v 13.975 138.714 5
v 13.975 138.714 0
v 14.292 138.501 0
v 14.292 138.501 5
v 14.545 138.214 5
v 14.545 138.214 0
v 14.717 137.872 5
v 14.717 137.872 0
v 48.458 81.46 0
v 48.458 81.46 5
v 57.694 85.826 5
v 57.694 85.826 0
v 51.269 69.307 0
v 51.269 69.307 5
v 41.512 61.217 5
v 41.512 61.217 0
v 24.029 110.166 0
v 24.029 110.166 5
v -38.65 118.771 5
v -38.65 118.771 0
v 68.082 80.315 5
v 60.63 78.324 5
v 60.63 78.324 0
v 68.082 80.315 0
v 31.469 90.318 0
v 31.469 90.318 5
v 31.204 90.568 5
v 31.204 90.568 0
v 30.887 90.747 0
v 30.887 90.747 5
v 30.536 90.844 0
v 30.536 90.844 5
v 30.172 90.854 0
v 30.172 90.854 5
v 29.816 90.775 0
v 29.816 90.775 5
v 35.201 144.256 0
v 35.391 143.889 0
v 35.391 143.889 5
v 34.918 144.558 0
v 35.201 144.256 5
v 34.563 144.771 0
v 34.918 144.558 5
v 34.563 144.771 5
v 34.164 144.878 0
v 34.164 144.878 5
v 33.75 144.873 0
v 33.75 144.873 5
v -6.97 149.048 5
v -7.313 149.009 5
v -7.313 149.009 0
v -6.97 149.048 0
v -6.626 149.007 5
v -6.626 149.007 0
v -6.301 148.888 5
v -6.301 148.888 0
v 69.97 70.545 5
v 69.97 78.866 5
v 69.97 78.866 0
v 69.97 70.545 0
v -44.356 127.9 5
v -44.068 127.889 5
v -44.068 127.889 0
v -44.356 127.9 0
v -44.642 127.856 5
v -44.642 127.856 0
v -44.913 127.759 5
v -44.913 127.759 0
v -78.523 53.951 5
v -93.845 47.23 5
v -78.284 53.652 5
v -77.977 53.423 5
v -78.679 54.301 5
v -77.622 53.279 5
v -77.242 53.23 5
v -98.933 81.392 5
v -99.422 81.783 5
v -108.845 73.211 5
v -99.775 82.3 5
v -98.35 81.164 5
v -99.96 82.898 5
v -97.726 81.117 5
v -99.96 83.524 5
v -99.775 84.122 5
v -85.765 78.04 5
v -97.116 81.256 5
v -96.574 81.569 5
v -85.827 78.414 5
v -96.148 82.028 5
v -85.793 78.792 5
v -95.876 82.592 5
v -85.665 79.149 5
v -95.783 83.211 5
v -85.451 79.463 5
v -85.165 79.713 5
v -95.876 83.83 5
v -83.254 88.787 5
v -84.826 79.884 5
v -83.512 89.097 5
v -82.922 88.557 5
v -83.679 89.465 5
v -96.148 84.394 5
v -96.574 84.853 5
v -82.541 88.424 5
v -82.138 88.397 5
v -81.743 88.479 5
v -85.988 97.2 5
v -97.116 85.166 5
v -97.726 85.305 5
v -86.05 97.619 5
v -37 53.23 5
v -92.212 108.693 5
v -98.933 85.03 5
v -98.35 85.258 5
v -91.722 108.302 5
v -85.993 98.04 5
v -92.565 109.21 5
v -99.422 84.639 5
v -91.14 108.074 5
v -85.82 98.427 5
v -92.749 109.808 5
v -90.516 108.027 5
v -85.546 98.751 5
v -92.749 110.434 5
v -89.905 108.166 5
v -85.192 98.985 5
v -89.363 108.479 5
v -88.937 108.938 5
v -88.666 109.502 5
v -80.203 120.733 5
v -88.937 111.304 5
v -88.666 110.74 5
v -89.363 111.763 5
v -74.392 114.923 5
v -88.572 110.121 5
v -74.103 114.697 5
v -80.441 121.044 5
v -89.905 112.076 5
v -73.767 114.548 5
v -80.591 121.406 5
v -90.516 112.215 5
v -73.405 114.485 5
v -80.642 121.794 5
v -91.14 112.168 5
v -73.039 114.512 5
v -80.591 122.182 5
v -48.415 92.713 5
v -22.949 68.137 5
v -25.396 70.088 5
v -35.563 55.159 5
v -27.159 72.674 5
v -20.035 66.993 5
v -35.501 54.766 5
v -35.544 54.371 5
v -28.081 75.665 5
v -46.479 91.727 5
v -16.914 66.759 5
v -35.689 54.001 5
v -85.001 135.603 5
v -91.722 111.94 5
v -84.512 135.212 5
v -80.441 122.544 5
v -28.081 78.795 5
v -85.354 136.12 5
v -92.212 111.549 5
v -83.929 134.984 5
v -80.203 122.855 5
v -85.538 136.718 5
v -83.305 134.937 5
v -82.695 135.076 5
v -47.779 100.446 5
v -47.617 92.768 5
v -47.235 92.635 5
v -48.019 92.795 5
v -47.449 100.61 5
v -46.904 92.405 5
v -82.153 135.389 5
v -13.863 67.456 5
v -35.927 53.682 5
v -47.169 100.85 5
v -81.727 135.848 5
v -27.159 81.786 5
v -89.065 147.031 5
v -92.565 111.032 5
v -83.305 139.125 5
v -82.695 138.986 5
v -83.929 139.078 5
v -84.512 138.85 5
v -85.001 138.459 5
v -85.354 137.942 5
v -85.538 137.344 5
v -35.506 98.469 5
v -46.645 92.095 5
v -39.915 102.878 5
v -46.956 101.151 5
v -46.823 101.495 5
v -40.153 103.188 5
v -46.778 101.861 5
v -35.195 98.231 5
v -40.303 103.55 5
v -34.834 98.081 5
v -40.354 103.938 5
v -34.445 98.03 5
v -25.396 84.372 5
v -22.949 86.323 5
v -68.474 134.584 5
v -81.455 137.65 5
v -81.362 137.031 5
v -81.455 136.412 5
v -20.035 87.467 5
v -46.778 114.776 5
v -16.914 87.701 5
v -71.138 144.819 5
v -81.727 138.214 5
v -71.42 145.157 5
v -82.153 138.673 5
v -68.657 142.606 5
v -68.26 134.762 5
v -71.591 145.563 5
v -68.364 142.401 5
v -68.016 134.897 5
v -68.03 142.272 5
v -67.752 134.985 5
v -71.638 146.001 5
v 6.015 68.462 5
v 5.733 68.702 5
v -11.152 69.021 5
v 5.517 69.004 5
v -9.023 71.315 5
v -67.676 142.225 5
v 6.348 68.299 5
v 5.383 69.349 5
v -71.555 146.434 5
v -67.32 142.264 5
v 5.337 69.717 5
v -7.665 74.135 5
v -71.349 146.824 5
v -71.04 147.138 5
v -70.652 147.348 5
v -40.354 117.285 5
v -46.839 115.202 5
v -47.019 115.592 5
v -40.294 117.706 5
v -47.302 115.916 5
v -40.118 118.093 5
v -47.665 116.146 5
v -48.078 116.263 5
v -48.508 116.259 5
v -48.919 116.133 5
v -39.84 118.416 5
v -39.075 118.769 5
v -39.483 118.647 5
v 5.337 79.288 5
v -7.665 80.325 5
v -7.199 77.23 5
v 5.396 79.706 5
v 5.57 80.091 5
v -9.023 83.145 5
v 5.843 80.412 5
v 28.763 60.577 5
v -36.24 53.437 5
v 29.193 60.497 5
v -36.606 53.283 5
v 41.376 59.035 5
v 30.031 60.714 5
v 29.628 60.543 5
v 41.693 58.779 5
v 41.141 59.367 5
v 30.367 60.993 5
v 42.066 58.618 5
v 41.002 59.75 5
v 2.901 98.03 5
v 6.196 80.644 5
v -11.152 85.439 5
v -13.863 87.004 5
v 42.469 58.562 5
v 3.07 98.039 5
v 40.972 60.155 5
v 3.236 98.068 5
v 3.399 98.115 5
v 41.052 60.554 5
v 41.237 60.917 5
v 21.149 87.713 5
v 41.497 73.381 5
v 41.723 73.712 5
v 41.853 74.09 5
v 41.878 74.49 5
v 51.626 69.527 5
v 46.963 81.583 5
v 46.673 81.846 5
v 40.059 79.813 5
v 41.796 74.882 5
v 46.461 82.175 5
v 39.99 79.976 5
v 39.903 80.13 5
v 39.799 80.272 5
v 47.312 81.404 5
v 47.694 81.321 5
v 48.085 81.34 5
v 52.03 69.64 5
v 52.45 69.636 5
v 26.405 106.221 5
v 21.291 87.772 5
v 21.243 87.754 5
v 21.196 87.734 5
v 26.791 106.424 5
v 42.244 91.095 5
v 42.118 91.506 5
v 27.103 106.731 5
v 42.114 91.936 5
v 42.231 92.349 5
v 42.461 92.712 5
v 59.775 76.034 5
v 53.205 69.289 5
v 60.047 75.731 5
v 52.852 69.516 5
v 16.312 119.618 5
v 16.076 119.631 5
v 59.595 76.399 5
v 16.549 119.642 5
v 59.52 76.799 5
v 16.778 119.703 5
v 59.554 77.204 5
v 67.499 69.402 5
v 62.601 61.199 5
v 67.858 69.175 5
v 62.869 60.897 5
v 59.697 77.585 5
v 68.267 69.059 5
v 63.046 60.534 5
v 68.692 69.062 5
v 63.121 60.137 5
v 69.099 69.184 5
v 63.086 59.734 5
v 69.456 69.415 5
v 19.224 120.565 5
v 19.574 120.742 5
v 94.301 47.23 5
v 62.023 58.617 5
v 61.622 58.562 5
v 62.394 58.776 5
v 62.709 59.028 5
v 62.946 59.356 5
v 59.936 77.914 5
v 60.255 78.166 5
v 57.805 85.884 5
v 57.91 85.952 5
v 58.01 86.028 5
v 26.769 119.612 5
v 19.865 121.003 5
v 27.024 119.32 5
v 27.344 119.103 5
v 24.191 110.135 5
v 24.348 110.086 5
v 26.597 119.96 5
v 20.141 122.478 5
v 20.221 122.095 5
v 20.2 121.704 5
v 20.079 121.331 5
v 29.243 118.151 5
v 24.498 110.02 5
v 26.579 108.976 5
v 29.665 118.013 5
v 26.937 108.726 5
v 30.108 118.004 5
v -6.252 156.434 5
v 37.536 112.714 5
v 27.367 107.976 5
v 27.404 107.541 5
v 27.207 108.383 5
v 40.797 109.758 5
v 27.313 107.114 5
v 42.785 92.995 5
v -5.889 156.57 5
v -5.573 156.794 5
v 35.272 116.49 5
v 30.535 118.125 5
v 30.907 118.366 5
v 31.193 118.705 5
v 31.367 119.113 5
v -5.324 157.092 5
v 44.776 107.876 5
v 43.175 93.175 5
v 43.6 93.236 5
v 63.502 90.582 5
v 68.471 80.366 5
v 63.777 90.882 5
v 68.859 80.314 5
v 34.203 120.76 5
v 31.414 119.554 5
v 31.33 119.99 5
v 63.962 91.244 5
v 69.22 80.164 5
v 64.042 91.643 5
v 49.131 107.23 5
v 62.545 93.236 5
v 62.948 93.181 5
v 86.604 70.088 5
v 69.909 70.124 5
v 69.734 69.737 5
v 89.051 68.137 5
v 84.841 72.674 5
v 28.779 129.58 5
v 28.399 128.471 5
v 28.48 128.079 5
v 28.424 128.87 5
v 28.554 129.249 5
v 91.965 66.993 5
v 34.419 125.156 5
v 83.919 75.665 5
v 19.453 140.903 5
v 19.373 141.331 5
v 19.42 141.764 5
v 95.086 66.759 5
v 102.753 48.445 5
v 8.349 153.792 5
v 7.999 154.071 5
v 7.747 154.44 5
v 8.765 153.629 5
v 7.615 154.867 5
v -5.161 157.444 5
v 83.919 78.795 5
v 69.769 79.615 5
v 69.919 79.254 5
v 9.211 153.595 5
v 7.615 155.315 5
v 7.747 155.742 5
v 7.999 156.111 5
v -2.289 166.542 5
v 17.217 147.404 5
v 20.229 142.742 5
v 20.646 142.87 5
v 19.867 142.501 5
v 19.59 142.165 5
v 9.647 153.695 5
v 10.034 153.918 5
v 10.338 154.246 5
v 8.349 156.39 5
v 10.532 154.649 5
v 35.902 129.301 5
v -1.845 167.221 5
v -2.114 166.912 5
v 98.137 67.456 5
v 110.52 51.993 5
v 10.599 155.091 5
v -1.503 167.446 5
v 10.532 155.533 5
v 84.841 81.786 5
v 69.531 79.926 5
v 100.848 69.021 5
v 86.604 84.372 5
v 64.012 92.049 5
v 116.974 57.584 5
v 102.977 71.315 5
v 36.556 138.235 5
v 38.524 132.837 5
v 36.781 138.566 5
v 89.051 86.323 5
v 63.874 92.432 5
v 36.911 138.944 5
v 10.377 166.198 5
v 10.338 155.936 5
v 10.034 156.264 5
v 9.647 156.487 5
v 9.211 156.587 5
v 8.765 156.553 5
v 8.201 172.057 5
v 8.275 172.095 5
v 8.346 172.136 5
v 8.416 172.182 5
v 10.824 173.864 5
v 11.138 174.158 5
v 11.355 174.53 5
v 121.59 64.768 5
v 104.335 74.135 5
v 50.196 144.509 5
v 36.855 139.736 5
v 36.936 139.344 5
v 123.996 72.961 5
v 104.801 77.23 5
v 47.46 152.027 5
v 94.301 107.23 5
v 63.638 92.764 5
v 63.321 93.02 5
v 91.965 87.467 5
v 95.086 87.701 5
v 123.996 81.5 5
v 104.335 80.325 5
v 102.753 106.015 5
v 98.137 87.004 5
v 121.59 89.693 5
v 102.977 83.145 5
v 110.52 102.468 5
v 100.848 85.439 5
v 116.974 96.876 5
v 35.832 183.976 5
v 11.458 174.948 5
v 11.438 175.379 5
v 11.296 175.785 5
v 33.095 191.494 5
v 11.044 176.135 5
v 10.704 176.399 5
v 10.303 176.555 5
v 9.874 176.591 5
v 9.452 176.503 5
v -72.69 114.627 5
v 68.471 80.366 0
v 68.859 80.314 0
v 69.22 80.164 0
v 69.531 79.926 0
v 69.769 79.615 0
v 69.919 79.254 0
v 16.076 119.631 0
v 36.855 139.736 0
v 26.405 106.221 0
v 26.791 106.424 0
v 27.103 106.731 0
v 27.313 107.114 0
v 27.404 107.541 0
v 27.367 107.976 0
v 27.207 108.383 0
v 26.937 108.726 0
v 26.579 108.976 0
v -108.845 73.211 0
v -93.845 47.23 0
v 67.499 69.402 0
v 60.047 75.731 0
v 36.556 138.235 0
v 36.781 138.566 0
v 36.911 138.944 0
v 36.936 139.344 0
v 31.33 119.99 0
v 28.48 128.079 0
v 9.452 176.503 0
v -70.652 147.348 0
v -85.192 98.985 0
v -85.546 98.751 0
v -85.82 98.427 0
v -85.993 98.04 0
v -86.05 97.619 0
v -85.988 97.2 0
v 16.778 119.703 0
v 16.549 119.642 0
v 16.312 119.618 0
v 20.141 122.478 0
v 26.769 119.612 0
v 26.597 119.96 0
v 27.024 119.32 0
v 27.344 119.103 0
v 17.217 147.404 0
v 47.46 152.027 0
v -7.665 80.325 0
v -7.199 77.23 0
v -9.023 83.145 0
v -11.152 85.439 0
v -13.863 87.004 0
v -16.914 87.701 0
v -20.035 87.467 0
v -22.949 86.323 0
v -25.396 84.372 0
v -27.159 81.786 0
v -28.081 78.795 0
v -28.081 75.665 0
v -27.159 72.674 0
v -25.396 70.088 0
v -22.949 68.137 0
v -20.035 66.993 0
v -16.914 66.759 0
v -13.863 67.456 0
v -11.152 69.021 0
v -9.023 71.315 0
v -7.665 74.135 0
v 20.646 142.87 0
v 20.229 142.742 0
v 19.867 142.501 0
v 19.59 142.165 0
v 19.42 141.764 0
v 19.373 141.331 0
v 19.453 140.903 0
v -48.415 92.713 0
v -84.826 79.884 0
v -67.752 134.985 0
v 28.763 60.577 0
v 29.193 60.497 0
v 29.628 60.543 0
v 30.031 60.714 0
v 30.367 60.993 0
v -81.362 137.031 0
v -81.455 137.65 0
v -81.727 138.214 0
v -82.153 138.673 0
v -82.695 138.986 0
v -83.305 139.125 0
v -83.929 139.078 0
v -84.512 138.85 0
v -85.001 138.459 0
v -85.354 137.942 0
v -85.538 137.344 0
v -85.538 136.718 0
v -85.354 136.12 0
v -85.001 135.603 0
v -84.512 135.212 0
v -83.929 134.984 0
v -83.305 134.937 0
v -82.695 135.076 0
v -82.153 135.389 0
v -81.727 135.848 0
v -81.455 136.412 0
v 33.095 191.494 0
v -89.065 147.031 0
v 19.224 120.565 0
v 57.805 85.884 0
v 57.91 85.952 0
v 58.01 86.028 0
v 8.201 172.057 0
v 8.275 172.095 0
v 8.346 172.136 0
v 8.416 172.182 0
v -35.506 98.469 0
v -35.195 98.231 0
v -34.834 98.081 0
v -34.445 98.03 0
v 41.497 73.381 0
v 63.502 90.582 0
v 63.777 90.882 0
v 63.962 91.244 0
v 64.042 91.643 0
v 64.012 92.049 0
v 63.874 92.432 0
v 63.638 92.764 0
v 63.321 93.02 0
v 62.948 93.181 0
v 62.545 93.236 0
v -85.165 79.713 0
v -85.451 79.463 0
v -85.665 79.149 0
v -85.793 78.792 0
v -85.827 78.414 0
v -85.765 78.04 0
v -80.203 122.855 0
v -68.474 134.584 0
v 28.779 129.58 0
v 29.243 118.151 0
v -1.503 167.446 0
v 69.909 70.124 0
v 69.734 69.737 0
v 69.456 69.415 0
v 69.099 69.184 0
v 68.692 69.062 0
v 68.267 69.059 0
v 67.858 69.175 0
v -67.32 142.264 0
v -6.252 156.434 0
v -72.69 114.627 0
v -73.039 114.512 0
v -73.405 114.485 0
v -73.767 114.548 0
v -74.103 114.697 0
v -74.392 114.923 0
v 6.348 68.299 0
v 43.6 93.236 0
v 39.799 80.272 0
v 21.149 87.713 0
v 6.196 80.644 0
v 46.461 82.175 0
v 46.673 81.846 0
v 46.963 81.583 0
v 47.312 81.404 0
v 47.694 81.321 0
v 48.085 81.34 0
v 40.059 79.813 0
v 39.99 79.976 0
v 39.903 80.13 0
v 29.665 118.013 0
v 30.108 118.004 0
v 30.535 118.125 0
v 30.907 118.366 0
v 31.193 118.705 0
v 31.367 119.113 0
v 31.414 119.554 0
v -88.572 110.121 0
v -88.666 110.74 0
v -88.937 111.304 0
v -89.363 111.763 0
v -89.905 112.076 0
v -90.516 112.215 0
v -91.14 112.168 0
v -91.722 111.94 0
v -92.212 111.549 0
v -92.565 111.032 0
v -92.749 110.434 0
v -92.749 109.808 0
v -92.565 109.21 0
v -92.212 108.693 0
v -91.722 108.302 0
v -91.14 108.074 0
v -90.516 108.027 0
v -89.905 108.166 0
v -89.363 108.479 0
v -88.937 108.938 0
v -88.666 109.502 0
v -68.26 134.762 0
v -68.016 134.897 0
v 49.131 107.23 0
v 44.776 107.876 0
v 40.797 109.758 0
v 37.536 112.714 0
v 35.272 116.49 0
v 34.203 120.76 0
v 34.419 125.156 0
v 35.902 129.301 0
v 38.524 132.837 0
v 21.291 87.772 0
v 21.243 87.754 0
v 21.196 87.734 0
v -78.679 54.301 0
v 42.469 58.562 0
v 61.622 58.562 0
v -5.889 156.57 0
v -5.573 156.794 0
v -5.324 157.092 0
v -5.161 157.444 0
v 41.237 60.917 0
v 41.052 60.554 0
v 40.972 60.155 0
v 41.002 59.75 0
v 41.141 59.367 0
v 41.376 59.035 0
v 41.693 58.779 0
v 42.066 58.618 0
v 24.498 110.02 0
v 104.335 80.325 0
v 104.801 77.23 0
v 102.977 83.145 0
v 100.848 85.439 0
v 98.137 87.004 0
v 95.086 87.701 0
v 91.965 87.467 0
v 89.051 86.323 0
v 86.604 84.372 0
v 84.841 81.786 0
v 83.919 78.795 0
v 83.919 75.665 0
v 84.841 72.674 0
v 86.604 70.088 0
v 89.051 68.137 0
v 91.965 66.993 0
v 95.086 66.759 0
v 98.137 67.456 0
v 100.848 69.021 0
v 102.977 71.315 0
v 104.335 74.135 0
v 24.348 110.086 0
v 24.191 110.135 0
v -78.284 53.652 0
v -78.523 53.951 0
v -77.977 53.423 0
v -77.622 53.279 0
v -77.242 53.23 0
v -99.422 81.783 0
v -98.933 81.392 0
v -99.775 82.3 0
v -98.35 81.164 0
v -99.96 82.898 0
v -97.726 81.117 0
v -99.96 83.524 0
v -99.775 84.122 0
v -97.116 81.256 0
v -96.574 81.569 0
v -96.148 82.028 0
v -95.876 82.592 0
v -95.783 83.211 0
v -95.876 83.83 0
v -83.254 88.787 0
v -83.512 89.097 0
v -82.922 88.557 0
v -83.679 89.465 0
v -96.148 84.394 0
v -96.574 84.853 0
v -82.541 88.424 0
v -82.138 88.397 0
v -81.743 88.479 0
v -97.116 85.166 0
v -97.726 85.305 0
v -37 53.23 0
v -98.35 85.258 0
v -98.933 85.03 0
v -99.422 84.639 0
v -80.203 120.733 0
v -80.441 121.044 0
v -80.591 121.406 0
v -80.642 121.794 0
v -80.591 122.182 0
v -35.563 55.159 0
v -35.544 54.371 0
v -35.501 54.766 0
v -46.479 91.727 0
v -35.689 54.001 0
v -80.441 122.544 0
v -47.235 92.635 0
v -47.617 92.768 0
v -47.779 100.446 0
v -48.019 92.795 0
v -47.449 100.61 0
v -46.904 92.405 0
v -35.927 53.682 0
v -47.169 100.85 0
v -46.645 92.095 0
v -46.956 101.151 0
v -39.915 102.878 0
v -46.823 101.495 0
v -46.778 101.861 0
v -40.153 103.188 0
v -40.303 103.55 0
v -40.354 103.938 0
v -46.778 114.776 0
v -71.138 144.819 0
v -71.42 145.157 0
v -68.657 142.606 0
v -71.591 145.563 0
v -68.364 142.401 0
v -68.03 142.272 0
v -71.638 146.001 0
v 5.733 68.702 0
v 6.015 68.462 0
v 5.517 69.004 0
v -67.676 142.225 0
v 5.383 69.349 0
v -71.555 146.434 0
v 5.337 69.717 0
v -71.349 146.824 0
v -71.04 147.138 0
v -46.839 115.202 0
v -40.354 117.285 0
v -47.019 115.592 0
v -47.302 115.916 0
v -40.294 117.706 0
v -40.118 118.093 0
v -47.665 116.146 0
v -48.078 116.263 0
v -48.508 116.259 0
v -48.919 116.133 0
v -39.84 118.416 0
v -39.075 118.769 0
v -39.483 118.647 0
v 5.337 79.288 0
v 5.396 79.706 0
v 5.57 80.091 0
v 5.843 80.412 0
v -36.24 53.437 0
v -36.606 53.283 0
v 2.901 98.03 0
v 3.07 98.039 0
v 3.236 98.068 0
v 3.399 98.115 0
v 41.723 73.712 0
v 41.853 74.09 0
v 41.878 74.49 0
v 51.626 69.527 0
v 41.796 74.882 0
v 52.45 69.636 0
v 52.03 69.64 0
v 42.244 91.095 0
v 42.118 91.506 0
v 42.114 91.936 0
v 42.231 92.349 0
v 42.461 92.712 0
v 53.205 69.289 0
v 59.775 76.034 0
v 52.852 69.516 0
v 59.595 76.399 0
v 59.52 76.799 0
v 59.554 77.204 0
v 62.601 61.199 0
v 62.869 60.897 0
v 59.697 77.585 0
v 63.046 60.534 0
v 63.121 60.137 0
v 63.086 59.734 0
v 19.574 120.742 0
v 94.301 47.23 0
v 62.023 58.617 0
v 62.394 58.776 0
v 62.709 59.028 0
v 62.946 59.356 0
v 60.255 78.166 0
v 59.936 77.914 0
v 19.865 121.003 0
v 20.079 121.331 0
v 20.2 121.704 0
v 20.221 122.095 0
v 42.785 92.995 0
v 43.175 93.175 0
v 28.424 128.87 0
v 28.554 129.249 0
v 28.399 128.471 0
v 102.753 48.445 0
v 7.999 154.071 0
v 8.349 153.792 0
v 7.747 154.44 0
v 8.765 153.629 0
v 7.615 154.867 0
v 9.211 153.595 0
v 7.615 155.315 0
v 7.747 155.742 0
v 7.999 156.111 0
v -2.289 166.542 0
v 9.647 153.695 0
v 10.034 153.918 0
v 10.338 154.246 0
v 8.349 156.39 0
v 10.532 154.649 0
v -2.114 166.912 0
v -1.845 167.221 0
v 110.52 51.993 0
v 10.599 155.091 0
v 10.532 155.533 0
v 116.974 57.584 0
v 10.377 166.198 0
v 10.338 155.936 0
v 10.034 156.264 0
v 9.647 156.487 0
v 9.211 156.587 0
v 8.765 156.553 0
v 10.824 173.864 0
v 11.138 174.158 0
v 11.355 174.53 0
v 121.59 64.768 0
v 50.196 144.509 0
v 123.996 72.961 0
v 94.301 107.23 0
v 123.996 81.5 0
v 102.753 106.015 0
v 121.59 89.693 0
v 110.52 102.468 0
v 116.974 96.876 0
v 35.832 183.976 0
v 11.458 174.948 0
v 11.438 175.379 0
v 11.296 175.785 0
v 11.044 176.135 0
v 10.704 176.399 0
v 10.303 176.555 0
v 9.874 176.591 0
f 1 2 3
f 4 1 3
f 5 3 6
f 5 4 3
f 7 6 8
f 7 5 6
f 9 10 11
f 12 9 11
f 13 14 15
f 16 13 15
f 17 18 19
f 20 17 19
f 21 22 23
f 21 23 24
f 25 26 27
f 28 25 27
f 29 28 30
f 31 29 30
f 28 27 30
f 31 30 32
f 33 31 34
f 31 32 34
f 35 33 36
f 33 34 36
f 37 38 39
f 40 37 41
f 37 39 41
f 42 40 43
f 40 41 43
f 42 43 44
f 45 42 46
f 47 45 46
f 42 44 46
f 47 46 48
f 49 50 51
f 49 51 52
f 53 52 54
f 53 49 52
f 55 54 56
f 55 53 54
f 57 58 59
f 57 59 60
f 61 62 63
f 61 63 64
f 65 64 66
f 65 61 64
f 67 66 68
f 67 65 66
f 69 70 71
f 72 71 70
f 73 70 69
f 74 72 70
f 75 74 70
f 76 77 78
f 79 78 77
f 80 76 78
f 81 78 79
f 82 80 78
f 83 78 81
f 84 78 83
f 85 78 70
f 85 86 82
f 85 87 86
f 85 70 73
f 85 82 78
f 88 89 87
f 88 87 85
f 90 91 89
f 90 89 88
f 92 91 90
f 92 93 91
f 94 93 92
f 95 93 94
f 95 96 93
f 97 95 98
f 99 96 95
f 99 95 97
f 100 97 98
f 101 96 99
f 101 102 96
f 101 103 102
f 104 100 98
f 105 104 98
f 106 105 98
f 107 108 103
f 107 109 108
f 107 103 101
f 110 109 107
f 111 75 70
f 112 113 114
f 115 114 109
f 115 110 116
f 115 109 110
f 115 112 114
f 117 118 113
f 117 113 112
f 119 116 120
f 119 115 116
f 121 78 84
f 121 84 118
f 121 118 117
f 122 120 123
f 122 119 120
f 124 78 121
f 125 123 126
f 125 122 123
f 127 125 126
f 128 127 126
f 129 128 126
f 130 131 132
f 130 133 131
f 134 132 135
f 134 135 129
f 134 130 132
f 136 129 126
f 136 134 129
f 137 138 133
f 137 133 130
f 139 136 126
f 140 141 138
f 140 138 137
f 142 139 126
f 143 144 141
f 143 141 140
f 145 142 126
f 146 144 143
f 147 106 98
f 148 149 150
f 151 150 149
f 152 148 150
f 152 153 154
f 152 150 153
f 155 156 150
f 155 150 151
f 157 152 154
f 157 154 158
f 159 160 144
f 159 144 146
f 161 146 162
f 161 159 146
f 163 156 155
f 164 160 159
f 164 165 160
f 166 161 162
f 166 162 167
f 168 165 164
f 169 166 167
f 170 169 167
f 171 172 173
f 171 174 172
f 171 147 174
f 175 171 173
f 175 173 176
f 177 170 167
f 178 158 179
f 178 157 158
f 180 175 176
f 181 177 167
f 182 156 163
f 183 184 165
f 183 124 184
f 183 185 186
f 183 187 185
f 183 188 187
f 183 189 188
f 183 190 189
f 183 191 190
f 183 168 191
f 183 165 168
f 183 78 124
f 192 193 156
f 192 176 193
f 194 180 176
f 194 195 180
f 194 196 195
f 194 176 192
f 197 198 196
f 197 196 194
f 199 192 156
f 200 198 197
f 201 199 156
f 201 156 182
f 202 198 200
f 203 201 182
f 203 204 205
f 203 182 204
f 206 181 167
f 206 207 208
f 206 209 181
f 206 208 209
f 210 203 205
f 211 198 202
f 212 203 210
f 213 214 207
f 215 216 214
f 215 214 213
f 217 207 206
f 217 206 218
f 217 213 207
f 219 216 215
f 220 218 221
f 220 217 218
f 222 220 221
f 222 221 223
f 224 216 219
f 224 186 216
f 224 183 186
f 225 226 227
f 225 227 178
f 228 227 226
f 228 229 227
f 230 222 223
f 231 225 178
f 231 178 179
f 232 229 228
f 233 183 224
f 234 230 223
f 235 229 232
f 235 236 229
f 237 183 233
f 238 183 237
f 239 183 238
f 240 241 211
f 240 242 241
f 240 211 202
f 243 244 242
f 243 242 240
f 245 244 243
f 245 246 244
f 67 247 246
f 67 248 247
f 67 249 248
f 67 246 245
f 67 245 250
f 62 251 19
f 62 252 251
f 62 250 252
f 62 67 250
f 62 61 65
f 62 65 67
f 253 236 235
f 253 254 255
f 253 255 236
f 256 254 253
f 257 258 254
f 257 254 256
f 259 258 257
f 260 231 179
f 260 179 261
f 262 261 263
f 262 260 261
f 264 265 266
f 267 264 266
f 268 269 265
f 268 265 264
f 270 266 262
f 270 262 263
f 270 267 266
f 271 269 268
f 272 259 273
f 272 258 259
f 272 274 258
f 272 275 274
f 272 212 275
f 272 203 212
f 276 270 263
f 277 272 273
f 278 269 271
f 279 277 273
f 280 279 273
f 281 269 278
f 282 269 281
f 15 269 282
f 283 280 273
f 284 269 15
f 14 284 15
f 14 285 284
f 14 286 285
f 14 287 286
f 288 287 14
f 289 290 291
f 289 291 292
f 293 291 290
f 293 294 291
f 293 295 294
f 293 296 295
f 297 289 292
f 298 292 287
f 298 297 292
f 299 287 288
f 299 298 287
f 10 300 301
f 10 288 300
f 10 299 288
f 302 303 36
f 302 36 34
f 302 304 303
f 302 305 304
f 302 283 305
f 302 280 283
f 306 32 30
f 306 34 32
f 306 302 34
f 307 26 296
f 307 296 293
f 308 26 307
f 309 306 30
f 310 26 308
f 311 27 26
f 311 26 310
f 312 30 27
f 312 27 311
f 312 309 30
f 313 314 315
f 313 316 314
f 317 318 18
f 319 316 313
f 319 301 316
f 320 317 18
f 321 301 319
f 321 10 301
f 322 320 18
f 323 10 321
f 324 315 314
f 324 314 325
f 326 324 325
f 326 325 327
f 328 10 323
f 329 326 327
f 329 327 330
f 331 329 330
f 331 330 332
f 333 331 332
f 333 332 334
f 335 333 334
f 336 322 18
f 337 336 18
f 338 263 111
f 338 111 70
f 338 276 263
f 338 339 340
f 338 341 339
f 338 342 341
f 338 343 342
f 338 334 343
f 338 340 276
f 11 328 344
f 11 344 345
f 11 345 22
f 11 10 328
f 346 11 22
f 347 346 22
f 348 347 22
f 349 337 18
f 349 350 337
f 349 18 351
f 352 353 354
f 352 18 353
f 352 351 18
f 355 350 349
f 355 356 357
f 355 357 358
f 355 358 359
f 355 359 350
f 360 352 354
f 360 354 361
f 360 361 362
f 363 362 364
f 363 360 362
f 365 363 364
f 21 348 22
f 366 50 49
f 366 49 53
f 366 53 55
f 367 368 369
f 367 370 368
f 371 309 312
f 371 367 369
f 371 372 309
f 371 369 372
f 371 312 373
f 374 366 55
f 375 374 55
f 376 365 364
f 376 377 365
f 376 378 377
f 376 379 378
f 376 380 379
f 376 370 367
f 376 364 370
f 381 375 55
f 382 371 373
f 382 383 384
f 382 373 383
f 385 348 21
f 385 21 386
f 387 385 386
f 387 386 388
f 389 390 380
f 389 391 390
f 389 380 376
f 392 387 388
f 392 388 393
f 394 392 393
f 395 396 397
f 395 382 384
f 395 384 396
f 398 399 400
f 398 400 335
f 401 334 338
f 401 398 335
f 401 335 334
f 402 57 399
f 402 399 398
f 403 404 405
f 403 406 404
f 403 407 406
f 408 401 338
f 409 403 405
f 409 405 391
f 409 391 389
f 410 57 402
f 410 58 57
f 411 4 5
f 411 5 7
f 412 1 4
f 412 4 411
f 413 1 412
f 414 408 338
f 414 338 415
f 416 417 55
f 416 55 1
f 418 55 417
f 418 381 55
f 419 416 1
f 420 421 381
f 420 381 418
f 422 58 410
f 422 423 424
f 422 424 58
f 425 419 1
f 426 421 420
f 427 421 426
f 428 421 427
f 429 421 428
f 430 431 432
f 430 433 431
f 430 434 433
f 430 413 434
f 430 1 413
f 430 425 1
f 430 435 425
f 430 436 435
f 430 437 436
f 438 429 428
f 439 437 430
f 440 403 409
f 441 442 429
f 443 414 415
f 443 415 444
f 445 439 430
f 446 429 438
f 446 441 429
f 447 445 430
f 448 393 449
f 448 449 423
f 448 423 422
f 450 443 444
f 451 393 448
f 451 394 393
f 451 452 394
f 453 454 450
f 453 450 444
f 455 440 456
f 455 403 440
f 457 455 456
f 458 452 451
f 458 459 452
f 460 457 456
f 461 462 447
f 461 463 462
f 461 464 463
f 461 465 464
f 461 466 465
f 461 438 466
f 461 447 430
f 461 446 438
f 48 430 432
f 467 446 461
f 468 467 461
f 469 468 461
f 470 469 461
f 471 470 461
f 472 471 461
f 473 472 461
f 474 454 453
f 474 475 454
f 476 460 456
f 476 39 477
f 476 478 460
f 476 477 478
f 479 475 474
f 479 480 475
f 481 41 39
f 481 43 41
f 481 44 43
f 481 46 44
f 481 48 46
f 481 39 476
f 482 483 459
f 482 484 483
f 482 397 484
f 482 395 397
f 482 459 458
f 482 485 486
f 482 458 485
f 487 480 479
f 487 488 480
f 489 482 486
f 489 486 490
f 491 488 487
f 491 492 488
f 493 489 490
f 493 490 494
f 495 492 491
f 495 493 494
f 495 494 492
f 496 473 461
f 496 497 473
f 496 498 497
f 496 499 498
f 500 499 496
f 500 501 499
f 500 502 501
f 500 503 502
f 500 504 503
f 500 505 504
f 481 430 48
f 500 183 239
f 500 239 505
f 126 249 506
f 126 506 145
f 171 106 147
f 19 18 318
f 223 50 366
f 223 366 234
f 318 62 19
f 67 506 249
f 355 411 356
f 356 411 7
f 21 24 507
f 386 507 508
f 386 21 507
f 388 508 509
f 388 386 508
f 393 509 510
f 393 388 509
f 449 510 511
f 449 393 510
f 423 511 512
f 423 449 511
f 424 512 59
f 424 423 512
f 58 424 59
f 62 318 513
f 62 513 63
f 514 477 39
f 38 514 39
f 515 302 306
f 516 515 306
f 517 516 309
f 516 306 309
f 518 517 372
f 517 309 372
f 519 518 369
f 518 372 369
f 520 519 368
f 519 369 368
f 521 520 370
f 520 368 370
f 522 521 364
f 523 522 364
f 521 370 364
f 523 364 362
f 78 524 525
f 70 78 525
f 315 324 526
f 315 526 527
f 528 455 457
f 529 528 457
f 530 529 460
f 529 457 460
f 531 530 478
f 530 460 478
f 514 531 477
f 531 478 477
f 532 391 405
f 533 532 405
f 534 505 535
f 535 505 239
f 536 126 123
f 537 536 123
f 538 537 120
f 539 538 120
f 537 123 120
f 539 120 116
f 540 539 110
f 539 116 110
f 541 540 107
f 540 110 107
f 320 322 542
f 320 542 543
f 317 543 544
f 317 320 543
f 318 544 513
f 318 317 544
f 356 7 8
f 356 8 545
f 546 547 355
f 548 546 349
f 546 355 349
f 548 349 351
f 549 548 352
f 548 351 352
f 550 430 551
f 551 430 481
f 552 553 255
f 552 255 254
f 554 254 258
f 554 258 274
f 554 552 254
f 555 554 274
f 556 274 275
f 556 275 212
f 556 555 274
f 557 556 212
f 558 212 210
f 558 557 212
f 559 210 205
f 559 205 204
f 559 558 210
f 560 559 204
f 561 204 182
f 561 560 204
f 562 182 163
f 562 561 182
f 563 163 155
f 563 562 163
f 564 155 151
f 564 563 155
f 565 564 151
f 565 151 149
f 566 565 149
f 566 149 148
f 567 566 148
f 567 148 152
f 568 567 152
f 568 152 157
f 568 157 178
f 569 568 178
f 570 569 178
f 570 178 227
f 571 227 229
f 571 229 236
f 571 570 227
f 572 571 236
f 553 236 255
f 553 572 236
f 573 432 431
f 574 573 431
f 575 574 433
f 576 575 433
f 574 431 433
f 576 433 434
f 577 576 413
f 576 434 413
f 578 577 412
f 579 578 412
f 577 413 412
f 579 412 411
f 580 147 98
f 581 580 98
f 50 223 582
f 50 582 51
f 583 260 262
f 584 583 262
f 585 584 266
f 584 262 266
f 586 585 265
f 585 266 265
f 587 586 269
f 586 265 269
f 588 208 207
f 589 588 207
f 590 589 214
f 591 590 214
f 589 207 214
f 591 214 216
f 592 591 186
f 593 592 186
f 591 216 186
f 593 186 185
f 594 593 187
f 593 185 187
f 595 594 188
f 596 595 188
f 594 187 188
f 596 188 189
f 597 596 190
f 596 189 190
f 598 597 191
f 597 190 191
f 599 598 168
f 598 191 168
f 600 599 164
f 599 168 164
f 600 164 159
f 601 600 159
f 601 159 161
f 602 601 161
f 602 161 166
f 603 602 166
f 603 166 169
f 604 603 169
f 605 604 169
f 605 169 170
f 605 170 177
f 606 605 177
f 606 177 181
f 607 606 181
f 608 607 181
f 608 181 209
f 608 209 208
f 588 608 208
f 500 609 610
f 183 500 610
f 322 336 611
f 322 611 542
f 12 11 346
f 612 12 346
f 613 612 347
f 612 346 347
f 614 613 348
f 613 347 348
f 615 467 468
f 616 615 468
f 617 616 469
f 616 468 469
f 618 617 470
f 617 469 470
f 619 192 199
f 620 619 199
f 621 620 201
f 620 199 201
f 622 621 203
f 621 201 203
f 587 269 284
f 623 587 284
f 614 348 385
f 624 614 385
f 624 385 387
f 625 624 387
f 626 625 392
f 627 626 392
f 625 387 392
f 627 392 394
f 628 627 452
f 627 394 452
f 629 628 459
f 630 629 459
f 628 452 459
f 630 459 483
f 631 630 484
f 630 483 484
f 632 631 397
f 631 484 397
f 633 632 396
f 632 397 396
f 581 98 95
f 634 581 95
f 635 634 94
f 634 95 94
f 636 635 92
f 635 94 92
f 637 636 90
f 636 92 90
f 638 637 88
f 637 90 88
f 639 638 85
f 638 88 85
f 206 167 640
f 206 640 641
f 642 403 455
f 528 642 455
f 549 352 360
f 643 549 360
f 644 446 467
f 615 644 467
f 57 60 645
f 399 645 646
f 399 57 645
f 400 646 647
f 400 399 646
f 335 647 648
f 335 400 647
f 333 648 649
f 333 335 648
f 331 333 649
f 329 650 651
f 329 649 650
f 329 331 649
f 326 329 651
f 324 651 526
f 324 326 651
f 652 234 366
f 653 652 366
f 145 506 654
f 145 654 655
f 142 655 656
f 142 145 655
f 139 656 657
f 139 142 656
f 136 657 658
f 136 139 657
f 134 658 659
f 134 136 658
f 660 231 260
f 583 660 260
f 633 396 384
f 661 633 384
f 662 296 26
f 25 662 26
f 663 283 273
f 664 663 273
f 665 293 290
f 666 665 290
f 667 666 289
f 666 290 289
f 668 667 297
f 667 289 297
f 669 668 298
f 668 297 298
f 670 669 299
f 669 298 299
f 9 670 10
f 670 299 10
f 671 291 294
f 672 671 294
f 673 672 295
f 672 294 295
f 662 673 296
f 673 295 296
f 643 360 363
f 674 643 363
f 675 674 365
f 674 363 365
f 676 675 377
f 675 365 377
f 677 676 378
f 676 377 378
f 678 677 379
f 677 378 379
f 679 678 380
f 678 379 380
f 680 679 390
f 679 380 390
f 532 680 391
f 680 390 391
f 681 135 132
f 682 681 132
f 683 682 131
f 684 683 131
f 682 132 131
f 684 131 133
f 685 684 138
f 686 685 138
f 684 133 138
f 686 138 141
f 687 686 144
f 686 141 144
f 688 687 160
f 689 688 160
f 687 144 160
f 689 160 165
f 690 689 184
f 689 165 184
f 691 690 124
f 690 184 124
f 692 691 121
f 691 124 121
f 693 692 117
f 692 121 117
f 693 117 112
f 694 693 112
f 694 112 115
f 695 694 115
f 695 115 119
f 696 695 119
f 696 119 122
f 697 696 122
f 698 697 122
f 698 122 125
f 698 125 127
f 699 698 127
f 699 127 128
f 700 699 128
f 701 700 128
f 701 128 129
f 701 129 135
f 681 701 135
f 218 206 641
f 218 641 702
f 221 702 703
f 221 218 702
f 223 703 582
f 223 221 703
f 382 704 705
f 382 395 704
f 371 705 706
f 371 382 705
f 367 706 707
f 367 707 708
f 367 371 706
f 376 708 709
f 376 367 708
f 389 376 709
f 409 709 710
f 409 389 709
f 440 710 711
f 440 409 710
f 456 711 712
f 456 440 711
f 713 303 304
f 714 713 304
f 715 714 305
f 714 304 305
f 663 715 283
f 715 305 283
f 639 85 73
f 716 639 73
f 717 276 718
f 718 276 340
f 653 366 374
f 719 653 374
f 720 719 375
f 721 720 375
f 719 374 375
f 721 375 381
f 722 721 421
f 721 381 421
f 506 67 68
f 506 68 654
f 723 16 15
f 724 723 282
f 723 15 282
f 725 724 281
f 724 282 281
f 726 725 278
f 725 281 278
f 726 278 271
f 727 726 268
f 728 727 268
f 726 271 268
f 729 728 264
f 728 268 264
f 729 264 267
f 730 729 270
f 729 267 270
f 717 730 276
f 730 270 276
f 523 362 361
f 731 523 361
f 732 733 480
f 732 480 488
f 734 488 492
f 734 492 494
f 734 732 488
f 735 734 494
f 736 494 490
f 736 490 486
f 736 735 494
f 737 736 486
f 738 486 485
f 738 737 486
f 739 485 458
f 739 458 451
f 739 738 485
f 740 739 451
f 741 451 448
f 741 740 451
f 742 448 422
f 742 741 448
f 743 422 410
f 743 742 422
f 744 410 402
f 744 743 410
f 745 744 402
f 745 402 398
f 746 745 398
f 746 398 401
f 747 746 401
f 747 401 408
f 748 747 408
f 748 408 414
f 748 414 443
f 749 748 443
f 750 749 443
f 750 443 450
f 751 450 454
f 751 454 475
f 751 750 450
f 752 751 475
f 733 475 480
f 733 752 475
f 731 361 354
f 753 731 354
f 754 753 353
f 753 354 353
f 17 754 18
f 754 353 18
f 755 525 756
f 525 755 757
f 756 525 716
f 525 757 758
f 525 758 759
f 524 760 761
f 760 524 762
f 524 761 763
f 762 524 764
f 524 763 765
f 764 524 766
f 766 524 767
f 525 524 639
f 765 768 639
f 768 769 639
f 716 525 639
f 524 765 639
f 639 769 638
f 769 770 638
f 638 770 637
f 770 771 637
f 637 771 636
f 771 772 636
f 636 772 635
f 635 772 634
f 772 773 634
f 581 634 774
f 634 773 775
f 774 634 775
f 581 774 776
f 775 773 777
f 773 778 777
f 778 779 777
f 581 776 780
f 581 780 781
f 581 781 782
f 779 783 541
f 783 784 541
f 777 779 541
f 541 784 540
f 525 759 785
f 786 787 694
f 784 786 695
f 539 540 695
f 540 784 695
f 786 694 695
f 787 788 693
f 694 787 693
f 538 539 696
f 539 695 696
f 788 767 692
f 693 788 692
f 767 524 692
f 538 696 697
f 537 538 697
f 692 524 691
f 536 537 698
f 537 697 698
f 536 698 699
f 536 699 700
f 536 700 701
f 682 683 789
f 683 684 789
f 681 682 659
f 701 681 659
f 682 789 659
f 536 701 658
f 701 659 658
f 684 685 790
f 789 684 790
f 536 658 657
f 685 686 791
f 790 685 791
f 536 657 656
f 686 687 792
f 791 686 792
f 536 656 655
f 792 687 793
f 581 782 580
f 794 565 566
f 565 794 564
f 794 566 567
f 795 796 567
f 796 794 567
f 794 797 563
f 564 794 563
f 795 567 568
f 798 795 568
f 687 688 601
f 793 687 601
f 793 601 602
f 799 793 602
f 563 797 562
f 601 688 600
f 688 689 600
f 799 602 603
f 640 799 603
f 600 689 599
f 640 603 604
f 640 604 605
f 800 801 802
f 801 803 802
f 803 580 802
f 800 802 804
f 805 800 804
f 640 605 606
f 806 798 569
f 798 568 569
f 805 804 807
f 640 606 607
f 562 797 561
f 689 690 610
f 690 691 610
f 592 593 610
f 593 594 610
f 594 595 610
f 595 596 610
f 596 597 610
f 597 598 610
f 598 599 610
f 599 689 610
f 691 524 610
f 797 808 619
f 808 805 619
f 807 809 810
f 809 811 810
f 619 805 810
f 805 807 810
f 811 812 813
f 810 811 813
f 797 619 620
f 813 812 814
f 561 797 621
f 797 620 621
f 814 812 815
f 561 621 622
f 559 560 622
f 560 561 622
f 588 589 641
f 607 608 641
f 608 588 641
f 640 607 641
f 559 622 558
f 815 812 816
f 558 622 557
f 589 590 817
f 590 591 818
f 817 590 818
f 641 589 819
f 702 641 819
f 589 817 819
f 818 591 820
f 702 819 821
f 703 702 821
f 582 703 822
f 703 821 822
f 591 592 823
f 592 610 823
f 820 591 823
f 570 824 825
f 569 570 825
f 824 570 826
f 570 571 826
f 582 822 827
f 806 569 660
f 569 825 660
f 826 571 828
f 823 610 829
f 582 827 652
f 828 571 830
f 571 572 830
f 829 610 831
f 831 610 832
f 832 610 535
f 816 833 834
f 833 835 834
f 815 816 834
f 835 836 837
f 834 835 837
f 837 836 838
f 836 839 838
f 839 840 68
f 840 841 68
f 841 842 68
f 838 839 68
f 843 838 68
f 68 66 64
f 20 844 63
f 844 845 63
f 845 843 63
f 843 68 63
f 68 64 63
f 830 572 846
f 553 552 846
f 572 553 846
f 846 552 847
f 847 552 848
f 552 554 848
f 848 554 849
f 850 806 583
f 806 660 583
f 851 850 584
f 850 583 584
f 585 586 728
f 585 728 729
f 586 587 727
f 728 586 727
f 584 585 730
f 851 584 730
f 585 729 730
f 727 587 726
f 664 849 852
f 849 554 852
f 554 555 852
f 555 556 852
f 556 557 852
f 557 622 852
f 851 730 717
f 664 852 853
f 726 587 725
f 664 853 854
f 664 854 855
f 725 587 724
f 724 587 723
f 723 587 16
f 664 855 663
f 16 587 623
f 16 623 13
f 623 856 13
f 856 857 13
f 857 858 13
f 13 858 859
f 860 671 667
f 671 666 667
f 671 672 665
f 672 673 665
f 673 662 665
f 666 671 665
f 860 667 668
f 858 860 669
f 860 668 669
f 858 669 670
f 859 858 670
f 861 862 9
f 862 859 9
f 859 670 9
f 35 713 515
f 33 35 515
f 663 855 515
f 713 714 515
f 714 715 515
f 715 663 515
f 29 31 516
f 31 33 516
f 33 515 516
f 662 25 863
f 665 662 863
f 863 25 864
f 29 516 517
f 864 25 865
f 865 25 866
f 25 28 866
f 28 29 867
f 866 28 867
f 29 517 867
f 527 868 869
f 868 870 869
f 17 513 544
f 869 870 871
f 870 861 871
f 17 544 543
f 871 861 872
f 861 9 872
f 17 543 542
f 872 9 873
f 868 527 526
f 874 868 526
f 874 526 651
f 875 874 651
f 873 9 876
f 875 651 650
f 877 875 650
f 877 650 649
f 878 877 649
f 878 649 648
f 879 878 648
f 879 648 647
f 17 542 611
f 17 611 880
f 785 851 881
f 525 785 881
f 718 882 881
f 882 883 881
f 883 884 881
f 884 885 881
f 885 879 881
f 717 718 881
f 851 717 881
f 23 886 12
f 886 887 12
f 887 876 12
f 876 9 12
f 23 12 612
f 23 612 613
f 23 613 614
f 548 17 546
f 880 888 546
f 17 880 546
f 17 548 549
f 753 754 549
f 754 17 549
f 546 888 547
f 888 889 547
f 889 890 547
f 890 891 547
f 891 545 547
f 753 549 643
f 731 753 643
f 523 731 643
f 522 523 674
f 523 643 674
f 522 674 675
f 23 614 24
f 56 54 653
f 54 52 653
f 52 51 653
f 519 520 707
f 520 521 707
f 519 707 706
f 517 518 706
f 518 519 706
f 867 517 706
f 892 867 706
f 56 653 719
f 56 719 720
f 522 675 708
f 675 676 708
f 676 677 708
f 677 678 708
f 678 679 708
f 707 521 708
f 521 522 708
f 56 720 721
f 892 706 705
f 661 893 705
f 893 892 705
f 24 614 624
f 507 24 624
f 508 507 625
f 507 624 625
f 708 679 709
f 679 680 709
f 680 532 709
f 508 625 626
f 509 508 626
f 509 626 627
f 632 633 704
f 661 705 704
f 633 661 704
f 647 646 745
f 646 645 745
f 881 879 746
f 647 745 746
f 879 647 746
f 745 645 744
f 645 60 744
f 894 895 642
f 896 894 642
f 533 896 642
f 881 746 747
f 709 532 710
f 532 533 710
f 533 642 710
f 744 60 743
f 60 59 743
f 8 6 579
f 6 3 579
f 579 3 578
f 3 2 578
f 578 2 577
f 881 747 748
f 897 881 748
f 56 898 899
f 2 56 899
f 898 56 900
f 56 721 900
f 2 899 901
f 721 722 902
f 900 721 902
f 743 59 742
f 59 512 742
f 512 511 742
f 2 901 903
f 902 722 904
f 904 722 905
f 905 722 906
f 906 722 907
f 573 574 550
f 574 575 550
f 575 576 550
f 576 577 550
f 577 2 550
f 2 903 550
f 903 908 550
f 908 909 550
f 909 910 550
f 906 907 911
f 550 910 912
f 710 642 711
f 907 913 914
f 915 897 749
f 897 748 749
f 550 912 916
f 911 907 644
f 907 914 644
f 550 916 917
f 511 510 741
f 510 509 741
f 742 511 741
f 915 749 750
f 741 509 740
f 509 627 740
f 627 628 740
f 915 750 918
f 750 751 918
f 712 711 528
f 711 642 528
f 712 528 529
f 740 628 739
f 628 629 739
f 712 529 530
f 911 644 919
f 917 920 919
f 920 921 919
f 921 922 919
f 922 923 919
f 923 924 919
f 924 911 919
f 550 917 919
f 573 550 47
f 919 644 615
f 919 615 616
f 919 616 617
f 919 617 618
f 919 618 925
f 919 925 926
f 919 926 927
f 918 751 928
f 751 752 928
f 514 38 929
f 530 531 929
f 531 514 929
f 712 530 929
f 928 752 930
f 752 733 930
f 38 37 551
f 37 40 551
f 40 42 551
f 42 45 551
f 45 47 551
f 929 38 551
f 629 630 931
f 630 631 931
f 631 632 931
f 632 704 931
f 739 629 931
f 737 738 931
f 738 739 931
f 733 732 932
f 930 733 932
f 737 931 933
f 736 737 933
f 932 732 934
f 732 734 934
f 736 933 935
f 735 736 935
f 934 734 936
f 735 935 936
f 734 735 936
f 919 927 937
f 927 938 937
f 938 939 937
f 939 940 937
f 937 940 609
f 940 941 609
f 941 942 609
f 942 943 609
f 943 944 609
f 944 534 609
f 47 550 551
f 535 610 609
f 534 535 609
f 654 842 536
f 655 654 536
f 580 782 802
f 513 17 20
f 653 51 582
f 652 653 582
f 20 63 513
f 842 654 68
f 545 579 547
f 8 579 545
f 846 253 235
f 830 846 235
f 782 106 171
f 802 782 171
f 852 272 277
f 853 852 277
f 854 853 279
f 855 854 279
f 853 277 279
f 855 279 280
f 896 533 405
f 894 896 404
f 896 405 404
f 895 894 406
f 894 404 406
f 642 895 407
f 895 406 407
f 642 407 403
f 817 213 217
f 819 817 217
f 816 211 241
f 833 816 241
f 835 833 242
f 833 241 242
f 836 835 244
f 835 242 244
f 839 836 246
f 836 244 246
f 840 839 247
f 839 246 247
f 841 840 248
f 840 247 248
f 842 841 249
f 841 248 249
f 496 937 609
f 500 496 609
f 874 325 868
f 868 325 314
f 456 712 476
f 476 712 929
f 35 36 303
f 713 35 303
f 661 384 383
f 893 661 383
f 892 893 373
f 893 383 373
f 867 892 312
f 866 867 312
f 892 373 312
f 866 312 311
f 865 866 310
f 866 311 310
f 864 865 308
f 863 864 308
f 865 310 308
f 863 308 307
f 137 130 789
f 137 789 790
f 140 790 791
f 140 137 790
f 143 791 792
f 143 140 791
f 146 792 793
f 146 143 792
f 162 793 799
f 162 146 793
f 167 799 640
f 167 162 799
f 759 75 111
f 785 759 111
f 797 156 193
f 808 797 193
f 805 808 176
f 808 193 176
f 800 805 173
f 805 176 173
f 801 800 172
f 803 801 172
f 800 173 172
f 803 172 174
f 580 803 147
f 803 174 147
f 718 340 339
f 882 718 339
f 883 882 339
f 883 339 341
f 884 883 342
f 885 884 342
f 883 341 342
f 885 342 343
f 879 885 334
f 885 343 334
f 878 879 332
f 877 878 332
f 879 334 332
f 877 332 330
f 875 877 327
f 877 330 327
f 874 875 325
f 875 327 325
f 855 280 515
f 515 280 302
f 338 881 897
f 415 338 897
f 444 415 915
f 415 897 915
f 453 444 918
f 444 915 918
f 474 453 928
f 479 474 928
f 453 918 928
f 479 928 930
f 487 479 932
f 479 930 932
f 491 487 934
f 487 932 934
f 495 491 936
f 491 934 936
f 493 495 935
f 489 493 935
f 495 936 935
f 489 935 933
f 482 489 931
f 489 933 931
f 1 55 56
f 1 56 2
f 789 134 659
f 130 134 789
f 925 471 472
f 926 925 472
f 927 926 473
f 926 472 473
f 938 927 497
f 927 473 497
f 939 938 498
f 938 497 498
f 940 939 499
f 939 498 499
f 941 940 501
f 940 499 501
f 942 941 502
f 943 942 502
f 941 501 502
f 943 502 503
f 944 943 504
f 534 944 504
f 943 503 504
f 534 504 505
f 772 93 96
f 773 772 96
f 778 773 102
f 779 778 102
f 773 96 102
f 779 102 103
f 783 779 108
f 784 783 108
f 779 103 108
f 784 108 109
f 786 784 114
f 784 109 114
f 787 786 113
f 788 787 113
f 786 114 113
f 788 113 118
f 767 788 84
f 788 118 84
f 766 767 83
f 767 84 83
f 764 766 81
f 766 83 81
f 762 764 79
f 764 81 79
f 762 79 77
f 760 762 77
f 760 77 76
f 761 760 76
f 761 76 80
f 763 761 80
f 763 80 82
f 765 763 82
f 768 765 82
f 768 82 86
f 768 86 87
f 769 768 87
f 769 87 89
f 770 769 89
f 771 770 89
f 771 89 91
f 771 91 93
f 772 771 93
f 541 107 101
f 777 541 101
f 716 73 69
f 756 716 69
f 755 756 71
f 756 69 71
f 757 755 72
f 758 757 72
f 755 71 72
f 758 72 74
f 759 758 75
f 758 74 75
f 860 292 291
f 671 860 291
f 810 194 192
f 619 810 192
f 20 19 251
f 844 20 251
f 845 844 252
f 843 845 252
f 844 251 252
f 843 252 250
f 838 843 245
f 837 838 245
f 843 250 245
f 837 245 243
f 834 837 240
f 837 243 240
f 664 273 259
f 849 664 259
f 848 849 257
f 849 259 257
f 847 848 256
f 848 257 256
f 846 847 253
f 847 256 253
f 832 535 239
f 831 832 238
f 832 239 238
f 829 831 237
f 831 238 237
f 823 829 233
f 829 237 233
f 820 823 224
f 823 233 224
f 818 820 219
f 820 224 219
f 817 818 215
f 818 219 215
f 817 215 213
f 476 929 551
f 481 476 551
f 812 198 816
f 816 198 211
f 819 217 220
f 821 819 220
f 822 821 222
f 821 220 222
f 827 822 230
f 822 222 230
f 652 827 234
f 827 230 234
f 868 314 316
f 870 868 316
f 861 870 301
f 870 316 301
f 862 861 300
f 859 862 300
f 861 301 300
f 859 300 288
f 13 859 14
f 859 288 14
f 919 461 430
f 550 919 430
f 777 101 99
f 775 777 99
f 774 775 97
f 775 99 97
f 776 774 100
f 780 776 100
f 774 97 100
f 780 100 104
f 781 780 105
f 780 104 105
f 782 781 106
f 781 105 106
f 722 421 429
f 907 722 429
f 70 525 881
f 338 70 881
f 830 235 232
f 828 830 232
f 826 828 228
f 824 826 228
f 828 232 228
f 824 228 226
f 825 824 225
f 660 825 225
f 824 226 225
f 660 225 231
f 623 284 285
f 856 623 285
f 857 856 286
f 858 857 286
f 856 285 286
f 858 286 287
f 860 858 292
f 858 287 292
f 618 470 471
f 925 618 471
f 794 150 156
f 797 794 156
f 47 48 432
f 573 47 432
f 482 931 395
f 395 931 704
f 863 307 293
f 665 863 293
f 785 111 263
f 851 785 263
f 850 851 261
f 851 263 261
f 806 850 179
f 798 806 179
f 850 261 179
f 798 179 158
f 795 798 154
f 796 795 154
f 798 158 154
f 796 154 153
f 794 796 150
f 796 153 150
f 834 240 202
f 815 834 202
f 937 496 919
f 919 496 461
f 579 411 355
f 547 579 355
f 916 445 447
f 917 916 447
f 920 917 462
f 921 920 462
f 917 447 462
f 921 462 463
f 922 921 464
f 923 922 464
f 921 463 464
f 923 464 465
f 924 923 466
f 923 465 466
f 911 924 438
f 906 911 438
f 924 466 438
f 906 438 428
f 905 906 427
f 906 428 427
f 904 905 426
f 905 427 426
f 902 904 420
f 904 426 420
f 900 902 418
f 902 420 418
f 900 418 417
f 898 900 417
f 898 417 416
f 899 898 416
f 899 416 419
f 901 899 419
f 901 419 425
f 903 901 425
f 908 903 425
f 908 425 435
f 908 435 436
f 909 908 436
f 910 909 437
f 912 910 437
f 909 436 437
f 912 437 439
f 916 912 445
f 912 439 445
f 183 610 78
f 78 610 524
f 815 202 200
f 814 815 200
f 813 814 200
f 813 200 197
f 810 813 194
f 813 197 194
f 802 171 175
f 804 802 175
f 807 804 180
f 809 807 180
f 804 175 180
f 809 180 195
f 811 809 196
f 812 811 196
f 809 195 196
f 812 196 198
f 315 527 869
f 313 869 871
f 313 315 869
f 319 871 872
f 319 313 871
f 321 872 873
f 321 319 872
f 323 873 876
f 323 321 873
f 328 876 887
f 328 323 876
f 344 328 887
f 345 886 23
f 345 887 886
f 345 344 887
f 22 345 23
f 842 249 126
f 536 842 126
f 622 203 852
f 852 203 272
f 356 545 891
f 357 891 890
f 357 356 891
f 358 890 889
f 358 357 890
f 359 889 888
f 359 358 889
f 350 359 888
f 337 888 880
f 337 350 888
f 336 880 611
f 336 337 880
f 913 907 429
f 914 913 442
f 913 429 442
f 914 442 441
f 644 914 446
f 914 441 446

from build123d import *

# Parameters (mm, degrees)
SKETCH1_R           = 10.5
BOSS_EXTRUDE1_DEPTH = 5
FILLET1_R           = 15
SKETCH2_R           = 1.5
CUT_EXTRUDE1_DEPTH  = 5
SKETCH4_R           = 2.1
CUT_EXTRUDE3_DEPTH  = 10
CUT_EXTRUDE4_DEPTH  = 10


with BuildPart() as part:
    # Sketch1 → Boss-Extrude1 (new body)
    with BuildSketch(Plane.XY):
        with BuildLine():
            Line((94.301272012, 107.23010703), (12.917479745, 107.23010703))
            Line((12.917479745, 107.23010703), (50.196394157, 144.509021441))
            Line((50.196394157, 144.509021441), (33.09538699, 191.493652481))
            Line((33.09538699, 191.493652481), (-89.064653712, 147.031033848))
            Line((-89.064653712, 147.031033848), (-108.84470723, 73.210869143))
            Line((-108.84470723, 73.210869143), (-93.84470723, 47.23010703))
            Line((-93.84470723, 47.23010703), (94.301272012, 47.23010703))
            ThreePointArc((94.301272012, 47.23010703), (124.301272012, 77.23010703), (94.301272012, 107.23010703))
        make_face()
        with Locations((-17.698727988, 77.23010703)):
            Circle(SKETCH1_R, mode=Mode.SUBTRACT)
        with Locations((94.301272012, 77.23010703)):
            Circle(SKETCH1_R, mode=Mode.SUBTRACT)
    extrude(amount=BOSS_EXTRUDE1_DEPTH)

    # Fillet1
    fillet1_edges = [part.edges().sort_by_distance(p)[0] for p in [
        (12.917479745, 107.23010703, 2.5),
    ]]
    fillet(fillet1_edges, radius=FILLET1_R)

    # Sketch2 → Cut-Extrude1 (cut)
    with BuildSketch(Plane.XY.offset(5)):
        with Locations((9.098668989, 155.090939324)):
            Circle(SKETCH2_R)
        Polygon((35.831548137, 183.976111514), (10.37693066, 166.197966248), (17.217333526, 147.404113833), (47.46023301, 152.026562408), align=None)
    extrude(amount=-CUT_EXTRUDE1_DEPTH, mode=Mode.SUBTRACT)

    # Sketch4 → Cut-Extrude3 (cut)
    with BuildSketch(Plane.XY.offset(5)):
        with Locations((-83.461936193, 137.031033848)):
            Circle(SKETCH4_R)
        with Locations((-90.672471028, 110.120951496)):
            Circle(SKETCH4_R)
        with Locations((-97.883005862, 83.210869143)):
            Circle(SKETCH4_R)
    extrude(amount=-CUT_EXTRUDE3_DEPTH, mode=Mode.SUBTRACT)

    # Sketch5 → Cut-Extrude4 (cut)
    with BuildSketch(Plane.XY.offset(5)):
        with BuildLine():
            Line((-48.918590023, 116.132580639), (-85.191500994, 98.984877604))
            ThreePointArc((-85.191500994, 98.984877604), (-85.920322831, 98.239804651), (-85.987744542, 97.199723264))
            Line((-85.987744542, 97.199723264), (-83.678802495, 89.464767405))
            ThreePointArc((-83.678802495, 89.464767405), (-82.922106683, 88.557131084), (-81.742997435, 88.479069431))
            Line((-81.742997435, 88.479069431), (-47.779028512, 100.446008168))
            ThreePointArc((-47.779028512, 100.446008168), (-47.053226731, 100.994074602), (-46.777505051, 101.860759433))
            Line((-46.777505051, 101.860759433), (-46.777505051, 114.776479588))
            ThreePointArc((-46.777505051, 114.776479588), (-47.474892896, 116.043686646), (-48.918590023, 116.132580639))
        make_face()
        with BuildLine():
            Line((-40.354065156, 117.285126681), (-40.354065156, 103.938271148))
            ThreePointArc((-40.354065156, 103.938271148), (-40.239884455, 103.364246), (-39.914725328, 102.877610977))
            Line((-39.914725328, 102.877610977), (-35.506024812, 98.468910461))
            ThreePointArc((-35.506024812, 98.468910461), (-35.019389788, 98.143751334), (-34.44536464, 98.029570632))
            Line((-34.44536464, 98.029570632), (2.900545466, 98.029570632))
            ThreePointArc((2.900545466, 98.029570632), (3.153402247, 98.05103641), (3.399022006, 98.114819368))
            Line((3.399022006, 98.114819368), (26.404973303, 106.220786324))
            ThreePointArc((26.404973303, 106.220786324), (27.403506638, 107.540872748), (26.579216219, 108.976227162))
            Line((26.579216219, 108.976227162), (24.498135227, 110.020453731))
            ThreePointArc((24.498135227, 110.020453731), (24.269772253, 110.112435549), (24.029439243, 110.16582419))
            Line((24.029439243, 110.16582419), (-38.650041684, 118.771186715))
            ThreePointArc((-38.650041684, 118.771186715), (-39.839956832, 118.415621088), (-40.354065156, 117.285126681))
        make_face()
        with BuildLine():
            Line((-74.392110194, 114.92256466), (-80.203002255, 120.733456721))
            ThreePointArc((-80.203002255, 120.733456721), (-80.642342083, 121.794116893), (-80.203002255, 122.854777065))
            Line((-80.203002255, 122.854777065), (-68.473782604, 134.583996716))
            ThreePointArc((-68.473782604, 134.583996716), (-68.141065775, 134.834861797), (-67.752173145, 134.98451573))
            Line((-67.752173145, 134.98451573), (-7.313265805, 149.008705779))
            ThreePointArc((-7.313265805, 149.008705779), (-6.796836559, 149.037001955), (-6.301495636, 148.888216166))
            Line((-6.301495636, 148.888216166), (13.97461757, 138.714245904))
            ThreePointArc((13.97461757, 138.714245904), (14.427382099, 138.365164015), (14.716649378, 137.87203287))
            Line((14.716649378, 137.87203287), (20.14067974, 122.477820308))
            ThreePointArc((20.14067974, 122.477820308), (20.07878483, 121.331439698), (19.224405015, 120.564592504))
            Line((19.224405015, 120.564592504), (16.778026718, 119.70263025))
            ThreePointArc((16.778026718, 119.70263025), (16.431032479, 119.625050079), (16.075526706, 119.631321481))
            Line((16.075526706, 119.631321481), (-44.068033081, 127.888523484))
            ThreePointArc((-44.068033081, 127.888523484), (-44.500043445, 127.885036207), (-44.913141524, 127.758564501))
            Line((-44.913141524, 127.758564501), (-72.690365051, 114.627123781))
            ThreePointArc((-72.690365051, 114.627123781), (-73.588027819, 114.505331793), (-74.392110194, 114.92256466))
        make_face()
        with BuildLine():
            Line((-85.765173696, 78.039759187), (-78.678992966, 54.30105374))
            ThreePointArc((-78.678992966, 54.30105374), (-78.137884303, 53.527281204), (-77.241664446, 53.23010703))
            Line((-77.241664446, 53.23010703), (-37.000229644, 53.23010703))
            ThreePointArc((-37.000229644, 53.23010703), (-35.797403818, 53.833887172), (-35.562901123, 55.159160319))
            Line((-35.562901123, 55.159160319), (-46.478753465, 91.727265664))
            ThreePointArc((-46.478753465, 91.727265664), (-47.235449276, 92.634901985), (-48.414558525, 92.712963639))
            Line((-48.414558525, 92.712963639), (-84.826321716, 79.88356374))
            ThreePointArc((-84.826321716, 79.88356374), (-85.664534787, 79.149445185), (-85.765173696, 78.039759187))
        make_face()
        with BuildLine():
            Line((-71.137681218, 144.818765729), (-68.657481405, 142.605973483))
            ThreePointArc((-68.657481405, 142.605973483), (-68.030328991, 142.271974344), (-67.319826927, 142.264075548))
            Line((-67.319826927, 142.264075548), (-6.252231197, 156.434145889))
            ThreePointArc((-6.252231197, 156.434145889), (-5.572632004, 156.794256335), (-5.160840216, 157.443842448))
            Line((-5.160840216, 157.443842448), (-2.289133326, 166.54233045))
            ThreePointArc((-2.289133326, 166.54233045), (-1.989907511, 167.075911596), (-1.502525339, 167.445646022))
            Line((-1.502525339, 167.445646022), (8.200620604, 172.056821639))
            ThreePointArc((8.200620604, 172.056821639), (8.310747045, 172.114876187), (8.415680154, 172.181862799))
            Line((8.415680154, 172.181862799), (10.823804629, 173.863757519))
            ThreePointArc((10.823804629, 173.863757519), (11.295841918, 175.785341043), (9.451881159, 176.503053489))
            Line((9.451881159, 176.503053489), (-70.652107667, 147.347585911))
            ThreePointArc((-70.652107667, 147.347585911), (-71.612166791, 146.220903478), (-71.137681218, 144.818765729))
        make_face()
        with BuildLine():
            Line((19.452688101, 140.902959313), (26.597478805, 119.959650962))
            ThreePointArc((26.597478805, 119.959650962), (26.886716152, 119.457994505), (27.344420536, 119.103277518))
            Line((27.344420536, 119.103277518), (29.242952451, 118.150648824))
            ThreePointArc((29.242952451, 118.150648824), (30.907279592, 118.365854413), (31.330423172, 119.989814938))
            Line((31.330423172, 119.989814938), (28.480406053, 128.078591439))
            ThreePointArc((28.480406053, 128.078591439), (28.42405424, 128.870079474), (28.779368612, 129.579572626))
            Line((28.779368612, 129.579572626), (36.555739431, 138.234681359))
            ThreePointArc((36.555739431, 138.234681359), (36.911053804, 138.944174511), (36.854701991, 139.735662546))
            Line((36.854701991, 139.735662546), (35.391422248, 143.888670161))
            ThreePointArc((35.391422248, 143.888670161), (34.74811051, 144.676615426), (33.750036797, 144.872973762))
            Line((33.750036797, 144.872973762), (20.645715101, 142.870055583))
            ThreePointArc((20.645715101, 142.870055583), (19.589797516, 142.165132082), (19.452688101, 140.902959313))
        make_face()
        with BuildLine():
            Line((29.815786136, 90.775099636), (21.291462651, 87.771620945))
            ThreePointArc((21.291462651, 87.771620945), (21.219404291, 87.744129544), (21.148854219, 87.712970731))
            Line((21.148854219, 87.712970731), (6.195871701, 80.644078358))
            ThreePointArc((6.195871701, 80.644078358), (5.569749615, 80.090589463), (5.336956673, 79.287977308))
            Line((5.336956673, 79.287977308), (5.336956673, 69.717357349))
            ThreePointArc((5.336956673, 69.717357349), (5.615715461, 68.846398164), (6.348383209, 68.299155681))
            Line((6.348383209, 68.299155681), (28.762867567, 60.577318579))
            ThreePointArc((28.762867567, 60.577318579), (29.627673329, 60.543470228), (30.367229735, 60.9930156))
            Line((30.367229735, 60.9930156), (41.497463613, 73.380977374))
            ThreePointArc((41.497463613, 73.380977374), (41.852777986, 74.090470526), (41.796426172, 74.88195856))
            Line((41.796426172, 74.88195856), (40.058915507, 79.813274708))
            ThreePointArc((40.058915507, 79.813274708), (39.949210994, 80.054293252), (39.798832512, 80.272264193))
            Line((39.798832512, 80.272264193), (31.468930944, 90.317814397))
            ThreePointArc((31.468930944, 90.317814397), (30.714168094, 90.806057767), (29.815786136, 90.775099636))
        make_face()
        with BuildLine():
            Line((42.24427744, 91.095227742), (46.46113264, 82.175221783))
            ThreePointArc((46.46113264, 82.175221783), (47.311640972, 81.404082975), (48.458318662, 81.460205704))
            Line((48.458318662, 81.460205704), (57.693632468, 85.826119946))
            ThreePointArc((57.693632468, 85.826119946), (57.85814362, 85.916908827), (58.010013522, 86.027552727))
            Line((58.010013522, 86.027552727), (63.502078057, 90.581644445))
            ThreePointArc((63.502078057, 90.581644445), (63.955640452, 92.245231959), (62.544612032, 93.236312714))
            Line((62.544612032, 93.236312714), (43.60037849, 93.236312714))
            ThreePointArc((43.60037849, 93.236312714), (42.333171432, 92.538924869), (42.24427744, 91.095227742))
        make_face()
        with BuildLine():
            Line((51.268567993, 69.307256916), (41.511994194, 61.21697836))
            ThreePointArc((41.511994194, 61.21697836), (41.058431799, 59.553390846), (42.469460219, 58.562310092))
            Line((42.469460219, 58.562310092), (61.622416924, 58.562310092))
            ThreePointArc((61.622416924, 58.562310092), (63.028666211, 59.540330264), (62.601128605, 61.19902617))
            Line((62.601128605, 61.19902617), (53.2047457, 69.289304726))
            ThreePointArc((53.2047457, 69.289304726), (52.239941382, 69.652524174), (51.268567993, 69.307256916))
        make_face()
        with BuildLine():
            Line((67.498580228, 69.401810839), (60.046591123, 75.731258856))
            ThreePointArc((60.046591123, 75.731258856), (59.554291768, 77.204084461), (60.630425962, 78.323686674))
            Line((60.630425962, 78.323686674), (68.082415068, 80.314857078))
            ThreePointArc((68.082415068, 80.314857078), (69.383188538, 80.055407885), (69.969630372, 78.865697215))
            Line((69.969630372, 78.865697215), (69.969630372, 70.545078794))
            ThreePointArc((69.969630372, 70.545078794), (69.099481459, 69.183723731), (67.498580228, 69.401810839))
        make_face()
    extrude(amount=-CUT_EXTRUDE4_DEPTH, mode=Mode.SUBTRACT)


solid = part.part
